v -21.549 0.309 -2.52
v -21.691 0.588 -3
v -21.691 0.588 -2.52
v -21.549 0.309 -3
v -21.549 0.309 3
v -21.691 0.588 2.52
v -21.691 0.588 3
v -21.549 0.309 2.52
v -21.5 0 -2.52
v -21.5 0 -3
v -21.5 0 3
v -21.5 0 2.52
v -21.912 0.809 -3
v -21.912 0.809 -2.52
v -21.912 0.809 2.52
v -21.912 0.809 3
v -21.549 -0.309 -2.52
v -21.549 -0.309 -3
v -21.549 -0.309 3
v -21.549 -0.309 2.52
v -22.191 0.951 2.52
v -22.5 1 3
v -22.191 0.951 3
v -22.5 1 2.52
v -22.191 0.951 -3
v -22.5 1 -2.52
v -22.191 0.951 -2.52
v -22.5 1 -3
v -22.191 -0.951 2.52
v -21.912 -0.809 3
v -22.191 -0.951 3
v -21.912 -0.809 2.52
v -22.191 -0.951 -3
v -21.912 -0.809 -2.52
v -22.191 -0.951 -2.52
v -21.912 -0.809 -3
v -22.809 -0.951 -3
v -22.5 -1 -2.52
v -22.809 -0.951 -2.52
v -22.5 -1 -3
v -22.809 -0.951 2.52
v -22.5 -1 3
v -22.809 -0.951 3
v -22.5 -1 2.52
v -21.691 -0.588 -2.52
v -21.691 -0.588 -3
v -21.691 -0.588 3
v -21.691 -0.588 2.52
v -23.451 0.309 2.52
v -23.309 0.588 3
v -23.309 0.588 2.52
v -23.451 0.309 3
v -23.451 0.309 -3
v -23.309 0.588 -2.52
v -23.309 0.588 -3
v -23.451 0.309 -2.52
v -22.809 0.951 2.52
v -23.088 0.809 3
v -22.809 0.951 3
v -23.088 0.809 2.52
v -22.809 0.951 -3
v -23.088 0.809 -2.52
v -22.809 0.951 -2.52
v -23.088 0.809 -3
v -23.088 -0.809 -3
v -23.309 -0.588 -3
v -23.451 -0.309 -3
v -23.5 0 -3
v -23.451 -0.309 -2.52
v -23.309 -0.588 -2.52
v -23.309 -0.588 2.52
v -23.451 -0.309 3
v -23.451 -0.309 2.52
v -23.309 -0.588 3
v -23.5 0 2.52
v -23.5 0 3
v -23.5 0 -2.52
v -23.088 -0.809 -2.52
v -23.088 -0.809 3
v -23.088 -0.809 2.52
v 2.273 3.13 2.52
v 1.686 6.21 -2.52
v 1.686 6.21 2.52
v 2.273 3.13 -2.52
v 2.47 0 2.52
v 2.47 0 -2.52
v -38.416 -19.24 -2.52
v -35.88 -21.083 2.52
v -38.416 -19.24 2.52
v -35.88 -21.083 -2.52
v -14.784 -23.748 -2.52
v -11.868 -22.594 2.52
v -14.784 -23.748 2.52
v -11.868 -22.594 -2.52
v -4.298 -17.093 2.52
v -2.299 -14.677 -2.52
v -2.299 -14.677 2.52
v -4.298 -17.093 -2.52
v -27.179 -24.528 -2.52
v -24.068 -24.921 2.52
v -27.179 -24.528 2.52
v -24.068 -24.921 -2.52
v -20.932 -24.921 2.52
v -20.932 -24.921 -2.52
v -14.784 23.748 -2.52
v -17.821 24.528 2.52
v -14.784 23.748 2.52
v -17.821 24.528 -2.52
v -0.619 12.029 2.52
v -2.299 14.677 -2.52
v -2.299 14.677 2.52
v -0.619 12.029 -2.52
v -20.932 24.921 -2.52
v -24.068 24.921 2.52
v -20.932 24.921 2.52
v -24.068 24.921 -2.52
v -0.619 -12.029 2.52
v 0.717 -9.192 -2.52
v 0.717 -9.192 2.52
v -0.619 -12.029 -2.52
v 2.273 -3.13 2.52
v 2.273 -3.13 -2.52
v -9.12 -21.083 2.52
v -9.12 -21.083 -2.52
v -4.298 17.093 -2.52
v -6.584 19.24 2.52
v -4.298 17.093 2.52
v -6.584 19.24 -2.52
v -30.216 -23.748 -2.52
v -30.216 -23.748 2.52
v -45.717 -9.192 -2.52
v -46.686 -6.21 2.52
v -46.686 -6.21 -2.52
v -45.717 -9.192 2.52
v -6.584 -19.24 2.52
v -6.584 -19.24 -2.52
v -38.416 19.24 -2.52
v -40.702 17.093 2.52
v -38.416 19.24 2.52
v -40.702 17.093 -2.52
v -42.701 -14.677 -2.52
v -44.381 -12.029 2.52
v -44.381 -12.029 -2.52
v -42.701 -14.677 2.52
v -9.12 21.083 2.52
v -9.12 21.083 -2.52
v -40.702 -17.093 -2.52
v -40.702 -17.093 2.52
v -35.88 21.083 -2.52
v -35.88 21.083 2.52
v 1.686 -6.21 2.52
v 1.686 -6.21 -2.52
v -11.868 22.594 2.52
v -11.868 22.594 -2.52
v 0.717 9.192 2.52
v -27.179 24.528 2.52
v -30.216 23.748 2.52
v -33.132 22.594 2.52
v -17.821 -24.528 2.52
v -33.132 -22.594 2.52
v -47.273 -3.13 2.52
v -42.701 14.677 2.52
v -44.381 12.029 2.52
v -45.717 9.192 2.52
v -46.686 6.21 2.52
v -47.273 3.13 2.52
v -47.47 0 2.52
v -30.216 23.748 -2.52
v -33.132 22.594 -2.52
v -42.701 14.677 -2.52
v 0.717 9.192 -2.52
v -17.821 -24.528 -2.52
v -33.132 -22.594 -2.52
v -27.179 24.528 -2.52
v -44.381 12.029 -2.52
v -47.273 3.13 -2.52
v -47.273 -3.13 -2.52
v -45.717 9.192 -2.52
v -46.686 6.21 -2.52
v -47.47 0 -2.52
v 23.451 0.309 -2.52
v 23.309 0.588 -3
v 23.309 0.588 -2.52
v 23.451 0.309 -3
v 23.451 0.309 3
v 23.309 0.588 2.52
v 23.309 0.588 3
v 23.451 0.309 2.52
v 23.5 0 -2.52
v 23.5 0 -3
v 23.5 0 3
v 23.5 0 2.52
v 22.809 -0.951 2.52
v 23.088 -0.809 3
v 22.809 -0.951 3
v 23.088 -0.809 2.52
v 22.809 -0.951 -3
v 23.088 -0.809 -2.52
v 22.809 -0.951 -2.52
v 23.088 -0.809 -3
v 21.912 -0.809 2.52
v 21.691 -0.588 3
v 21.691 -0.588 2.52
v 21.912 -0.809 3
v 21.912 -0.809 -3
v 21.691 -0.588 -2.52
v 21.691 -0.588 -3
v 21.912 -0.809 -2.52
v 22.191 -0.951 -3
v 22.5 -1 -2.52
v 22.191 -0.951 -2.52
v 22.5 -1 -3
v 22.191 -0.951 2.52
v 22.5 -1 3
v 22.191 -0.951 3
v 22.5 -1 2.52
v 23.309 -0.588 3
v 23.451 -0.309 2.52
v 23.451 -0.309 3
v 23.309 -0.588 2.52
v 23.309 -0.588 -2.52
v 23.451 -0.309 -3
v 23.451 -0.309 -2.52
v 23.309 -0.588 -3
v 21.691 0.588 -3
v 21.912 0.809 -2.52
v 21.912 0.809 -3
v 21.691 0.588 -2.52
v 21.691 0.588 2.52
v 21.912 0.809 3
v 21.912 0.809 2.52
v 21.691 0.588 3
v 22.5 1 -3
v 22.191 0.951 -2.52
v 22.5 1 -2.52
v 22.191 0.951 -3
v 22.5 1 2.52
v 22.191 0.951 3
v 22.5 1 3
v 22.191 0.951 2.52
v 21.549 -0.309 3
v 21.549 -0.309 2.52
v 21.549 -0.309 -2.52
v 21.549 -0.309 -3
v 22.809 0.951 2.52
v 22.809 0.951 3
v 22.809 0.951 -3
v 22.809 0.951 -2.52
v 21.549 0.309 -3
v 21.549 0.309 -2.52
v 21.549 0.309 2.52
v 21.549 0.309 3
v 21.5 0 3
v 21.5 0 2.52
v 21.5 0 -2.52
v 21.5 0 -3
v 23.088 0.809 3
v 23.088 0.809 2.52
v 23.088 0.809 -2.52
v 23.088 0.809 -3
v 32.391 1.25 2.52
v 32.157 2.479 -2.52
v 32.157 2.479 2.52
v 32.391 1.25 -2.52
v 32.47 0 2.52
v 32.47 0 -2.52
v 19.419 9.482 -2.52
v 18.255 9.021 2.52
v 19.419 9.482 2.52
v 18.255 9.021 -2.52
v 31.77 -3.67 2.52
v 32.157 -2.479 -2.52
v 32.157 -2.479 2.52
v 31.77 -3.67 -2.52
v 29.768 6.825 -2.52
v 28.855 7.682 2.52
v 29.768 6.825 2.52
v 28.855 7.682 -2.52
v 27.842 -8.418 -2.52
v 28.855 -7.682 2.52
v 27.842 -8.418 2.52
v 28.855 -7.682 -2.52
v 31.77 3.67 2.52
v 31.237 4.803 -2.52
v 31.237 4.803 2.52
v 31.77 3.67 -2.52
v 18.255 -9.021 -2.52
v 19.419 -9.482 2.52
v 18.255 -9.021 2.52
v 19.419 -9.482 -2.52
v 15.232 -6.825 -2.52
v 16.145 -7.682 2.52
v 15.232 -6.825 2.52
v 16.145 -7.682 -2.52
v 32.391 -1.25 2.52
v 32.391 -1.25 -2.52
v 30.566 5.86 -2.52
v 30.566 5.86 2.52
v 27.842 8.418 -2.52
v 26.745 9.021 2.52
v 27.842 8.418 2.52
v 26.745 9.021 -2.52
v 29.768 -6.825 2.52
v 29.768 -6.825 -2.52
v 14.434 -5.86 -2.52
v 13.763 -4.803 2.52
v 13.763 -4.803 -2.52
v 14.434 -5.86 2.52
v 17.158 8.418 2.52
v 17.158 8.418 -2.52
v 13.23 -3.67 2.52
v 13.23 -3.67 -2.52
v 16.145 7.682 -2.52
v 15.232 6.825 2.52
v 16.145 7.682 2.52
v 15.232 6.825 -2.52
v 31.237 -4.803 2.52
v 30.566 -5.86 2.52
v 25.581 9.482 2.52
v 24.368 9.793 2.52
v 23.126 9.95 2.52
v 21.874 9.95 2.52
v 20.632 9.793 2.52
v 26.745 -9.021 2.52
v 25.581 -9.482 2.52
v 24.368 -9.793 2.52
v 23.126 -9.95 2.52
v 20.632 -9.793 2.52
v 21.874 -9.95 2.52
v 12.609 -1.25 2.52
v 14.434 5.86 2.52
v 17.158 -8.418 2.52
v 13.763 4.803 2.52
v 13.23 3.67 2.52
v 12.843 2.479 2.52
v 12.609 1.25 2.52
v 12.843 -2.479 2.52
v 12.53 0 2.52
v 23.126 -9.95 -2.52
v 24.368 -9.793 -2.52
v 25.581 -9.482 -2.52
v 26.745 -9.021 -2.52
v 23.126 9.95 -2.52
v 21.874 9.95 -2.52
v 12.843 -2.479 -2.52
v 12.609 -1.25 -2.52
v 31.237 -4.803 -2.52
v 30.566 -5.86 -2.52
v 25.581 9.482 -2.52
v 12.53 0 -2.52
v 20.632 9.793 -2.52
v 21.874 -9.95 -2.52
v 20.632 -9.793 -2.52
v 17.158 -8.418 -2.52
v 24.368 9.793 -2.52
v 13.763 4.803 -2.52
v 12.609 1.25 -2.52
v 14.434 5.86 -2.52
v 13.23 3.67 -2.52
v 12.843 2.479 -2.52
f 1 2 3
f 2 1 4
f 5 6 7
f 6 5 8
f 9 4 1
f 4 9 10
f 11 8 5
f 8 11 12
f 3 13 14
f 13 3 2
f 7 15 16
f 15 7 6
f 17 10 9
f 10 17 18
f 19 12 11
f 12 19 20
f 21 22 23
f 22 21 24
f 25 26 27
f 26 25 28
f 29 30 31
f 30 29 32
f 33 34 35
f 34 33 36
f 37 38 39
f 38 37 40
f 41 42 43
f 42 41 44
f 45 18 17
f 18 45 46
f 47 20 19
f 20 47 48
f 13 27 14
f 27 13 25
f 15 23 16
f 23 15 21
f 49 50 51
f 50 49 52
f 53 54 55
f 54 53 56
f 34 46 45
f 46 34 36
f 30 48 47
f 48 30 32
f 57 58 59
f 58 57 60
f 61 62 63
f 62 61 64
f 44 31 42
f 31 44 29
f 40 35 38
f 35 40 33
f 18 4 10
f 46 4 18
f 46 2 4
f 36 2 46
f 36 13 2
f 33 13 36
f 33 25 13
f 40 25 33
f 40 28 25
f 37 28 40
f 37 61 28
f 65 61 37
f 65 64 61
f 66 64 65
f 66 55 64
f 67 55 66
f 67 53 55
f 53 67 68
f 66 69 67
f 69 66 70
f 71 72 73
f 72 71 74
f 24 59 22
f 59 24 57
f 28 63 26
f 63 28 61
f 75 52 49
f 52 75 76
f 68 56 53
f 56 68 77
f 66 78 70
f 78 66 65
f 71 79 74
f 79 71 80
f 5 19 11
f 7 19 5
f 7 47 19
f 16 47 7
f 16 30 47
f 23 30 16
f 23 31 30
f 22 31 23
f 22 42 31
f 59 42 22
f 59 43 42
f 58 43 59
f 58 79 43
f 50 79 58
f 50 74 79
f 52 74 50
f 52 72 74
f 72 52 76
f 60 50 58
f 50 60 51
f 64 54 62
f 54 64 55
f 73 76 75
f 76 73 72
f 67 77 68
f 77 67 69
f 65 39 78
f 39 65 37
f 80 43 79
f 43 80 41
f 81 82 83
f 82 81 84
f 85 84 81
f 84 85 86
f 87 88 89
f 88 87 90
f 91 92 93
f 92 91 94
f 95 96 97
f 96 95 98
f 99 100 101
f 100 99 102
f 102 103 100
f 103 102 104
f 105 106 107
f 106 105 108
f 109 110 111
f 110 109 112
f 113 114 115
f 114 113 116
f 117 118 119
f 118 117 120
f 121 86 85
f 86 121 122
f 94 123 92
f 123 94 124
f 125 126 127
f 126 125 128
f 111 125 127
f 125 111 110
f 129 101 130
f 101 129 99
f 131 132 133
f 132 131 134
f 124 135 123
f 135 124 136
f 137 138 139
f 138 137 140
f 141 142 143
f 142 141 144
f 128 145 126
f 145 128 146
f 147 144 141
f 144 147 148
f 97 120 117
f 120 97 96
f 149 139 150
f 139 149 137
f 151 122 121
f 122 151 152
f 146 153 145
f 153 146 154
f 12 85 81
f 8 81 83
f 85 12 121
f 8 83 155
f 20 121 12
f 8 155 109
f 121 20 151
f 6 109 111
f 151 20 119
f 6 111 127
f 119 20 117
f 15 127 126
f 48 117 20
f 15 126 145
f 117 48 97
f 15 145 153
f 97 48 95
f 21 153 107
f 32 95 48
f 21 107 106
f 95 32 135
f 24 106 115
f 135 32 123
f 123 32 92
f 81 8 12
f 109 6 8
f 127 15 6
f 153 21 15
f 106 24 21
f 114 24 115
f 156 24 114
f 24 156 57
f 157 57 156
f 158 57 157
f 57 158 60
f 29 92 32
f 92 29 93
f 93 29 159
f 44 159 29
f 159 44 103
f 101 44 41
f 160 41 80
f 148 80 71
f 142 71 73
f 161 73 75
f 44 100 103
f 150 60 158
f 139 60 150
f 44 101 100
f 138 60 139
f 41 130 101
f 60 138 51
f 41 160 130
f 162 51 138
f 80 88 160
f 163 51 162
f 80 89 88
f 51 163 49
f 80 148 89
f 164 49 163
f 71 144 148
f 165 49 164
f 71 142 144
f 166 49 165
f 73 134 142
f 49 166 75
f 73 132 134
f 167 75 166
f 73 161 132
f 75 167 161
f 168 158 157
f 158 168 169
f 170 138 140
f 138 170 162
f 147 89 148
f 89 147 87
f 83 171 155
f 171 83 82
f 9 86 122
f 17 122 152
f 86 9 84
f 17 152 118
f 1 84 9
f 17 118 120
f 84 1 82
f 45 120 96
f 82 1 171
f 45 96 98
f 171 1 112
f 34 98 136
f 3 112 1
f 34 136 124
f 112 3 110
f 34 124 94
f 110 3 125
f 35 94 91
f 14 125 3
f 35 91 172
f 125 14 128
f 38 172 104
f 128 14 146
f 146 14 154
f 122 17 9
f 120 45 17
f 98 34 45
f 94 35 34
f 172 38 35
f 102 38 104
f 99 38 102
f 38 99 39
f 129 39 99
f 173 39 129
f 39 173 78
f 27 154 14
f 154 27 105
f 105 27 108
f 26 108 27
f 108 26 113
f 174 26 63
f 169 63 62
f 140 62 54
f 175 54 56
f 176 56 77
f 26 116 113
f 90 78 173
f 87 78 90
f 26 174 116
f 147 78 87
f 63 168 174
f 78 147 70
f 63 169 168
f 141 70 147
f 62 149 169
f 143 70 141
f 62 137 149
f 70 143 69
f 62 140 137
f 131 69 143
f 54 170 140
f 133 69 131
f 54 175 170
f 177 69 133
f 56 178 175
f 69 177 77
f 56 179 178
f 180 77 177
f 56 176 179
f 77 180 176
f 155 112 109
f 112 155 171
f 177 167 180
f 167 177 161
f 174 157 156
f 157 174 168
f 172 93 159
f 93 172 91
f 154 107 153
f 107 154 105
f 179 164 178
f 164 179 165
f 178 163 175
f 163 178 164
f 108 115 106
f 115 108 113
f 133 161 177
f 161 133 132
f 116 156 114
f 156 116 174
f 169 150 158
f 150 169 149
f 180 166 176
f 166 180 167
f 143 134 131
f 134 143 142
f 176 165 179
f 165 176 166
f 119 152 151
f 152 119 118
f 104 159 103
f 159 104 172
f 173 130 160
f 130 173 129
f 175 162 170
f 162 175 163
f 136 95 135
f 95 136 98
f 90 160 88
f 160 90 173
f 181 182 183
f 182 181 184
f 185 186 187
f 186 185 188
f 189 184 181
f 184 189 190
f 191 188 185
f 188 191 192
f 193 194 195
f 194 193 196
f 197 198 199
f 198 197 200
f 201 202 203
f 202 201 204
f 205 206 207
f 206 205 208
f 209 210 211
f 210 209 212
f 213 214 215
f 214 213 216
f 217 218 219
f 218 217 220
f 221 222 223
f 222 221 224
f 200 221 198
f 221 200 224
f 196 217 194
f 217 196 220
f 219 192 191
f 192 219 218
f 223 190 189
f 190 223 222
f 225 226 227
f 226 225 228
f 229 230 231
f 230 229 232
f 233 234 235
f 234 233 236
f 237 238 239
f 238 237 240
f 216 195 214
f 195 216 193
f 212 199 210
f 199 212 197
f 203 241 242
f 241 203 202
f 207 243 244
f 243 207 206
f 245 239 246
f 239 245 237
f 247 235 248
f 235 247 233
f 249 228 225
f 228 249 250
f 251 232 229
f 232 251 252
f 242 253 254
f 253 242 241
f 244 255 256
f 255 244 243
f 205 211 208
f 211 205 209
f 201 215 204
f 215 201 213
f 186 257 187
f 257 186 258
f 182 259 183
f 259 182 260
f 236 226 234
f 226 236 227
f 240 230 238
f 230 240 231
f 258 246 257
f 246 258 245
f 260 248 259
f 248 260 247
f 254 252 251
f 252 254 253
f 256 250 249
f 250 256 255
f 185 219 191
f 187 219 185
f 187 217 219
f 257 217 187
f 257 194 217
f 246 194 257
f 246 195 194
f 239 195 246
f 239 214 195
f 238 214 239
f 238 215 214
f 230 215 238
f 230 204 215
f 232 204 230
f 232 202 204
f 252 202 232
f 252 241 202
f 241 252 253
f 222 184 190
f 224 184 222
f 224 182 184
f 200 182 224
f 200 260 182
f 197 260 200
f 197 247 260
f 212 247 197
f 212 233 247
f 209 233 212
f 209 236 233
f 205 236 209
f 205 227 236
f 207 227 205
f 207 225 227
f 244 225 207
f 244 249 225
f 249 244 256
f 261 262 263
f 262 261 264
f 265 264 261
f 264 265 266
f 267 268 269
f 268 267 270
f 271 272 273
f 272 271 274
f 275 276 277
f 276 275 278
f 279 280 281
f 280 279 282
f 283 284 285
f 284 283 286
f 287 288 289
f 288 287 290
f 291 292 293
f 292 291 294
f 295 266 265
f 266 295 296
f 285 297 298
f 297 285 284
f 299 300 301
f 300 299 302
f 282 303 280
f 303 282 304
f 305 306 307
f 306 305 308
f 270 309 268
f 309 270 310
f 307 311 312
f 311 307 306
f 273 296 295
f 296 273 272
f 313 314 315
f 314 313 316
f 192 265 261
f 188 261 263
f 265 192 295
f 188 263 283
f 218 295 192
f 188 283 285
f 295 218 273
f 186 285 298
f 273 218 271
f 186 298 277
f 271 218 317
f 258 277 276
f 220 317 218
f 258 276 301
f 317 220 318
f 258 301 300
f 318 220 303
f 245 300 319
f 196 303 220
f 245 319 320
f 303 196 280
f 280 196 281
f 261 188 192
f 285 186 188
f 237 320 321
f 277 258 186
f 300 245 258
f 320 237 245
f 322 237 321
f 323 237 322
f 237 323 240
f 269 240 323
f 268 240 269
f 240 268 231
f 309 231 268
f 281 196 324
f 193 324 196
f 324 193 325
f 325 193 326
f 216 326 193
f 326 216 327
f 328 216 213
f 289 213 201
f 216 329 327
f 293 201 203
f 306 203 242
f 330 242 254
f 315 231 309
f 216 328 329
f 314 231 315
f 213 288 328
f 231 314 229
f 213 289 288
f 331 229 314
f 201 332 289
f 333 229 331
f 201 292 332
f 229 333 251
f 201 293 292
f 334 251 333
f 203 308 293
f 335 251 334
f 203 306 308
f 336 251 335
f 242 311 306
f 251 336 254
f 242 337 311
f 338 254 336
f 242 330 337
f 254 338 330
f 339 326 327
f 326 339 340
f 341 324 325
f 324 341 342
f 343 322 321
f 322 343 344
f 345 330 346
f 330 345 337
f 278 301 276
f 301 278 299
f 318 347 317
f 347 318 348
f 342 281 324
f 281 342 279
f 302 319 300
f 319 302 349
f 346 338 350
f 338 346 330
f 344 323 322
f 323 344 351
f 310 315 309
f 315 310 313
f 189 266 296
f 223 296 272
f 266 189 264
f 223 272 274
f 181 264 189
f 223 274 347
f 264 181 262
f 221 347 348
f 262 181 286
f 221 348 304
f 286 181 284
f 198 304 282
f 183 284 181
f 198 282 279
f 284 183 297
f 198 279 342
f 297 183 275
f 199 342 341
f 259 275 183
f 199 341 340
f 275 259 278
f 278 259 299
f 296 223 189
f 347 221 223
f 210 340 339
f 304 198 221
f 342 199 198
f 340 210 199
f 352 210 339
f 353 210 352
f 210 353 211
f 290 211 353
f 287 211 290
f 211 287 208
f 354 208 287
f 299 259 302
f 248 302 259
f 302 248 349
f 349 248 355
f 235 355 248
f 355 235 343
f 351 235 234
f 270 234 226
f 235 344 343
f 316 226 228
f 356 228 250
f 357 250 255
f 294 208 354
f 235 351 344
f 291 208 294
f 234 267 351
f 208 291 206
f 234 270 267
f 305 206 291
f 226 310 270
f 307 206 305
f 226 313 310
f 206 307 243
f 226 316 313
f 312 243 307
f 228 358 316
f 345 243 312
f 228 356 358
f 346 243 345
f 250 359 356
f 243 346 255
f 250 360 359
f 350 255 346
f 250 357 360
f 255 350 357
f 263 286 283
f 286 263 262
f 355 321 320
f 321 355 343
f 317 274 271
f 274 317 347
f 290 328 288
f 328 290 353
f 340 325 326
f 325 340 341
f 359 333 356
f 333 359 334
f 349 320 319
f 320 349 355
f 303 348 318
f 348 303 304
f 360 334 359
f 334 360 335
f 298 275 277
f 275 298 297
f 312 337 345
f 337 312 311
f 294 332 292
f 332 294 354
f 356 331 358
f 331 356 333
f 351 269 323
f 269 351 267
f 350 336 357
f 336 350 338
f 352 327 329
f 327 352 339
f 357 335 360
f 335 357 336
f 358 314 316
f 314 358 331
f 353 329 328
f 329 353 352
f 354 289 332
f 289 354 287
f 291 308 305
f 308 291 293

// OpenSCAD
r1 = 25;
r2 = 10;
th = 5;
d = r1 + r2 + 10;


%hull() {
  translate([-d/2, 0, 0])
    cylinder(r = r1, h = th, center = true, $fn = 50);
    
  translate([d/2, 0, 0])
    cylinder(r = r2, h = th, center = true, $fn = 50);
}


color("blue")
translate([-d/2, 0, 0])
  cylinder(r = 1, h = th + 1, center = true, $fn = 20);


translate([-d/2, 0, 0]) 
  cylinder(r = r1-0.03, h = th + 0.04, center = true, $fn = 50);

  
color("blue")
translate([d/2, 0, 0])
  cylinder(r = 1, h = th + 1, center = true, $fn = 20);
  
  translate([d/2, 0, 0]) 
  cylinder(r = r2-0.03, h = th + 0.04, center = true, $fn = 50);
